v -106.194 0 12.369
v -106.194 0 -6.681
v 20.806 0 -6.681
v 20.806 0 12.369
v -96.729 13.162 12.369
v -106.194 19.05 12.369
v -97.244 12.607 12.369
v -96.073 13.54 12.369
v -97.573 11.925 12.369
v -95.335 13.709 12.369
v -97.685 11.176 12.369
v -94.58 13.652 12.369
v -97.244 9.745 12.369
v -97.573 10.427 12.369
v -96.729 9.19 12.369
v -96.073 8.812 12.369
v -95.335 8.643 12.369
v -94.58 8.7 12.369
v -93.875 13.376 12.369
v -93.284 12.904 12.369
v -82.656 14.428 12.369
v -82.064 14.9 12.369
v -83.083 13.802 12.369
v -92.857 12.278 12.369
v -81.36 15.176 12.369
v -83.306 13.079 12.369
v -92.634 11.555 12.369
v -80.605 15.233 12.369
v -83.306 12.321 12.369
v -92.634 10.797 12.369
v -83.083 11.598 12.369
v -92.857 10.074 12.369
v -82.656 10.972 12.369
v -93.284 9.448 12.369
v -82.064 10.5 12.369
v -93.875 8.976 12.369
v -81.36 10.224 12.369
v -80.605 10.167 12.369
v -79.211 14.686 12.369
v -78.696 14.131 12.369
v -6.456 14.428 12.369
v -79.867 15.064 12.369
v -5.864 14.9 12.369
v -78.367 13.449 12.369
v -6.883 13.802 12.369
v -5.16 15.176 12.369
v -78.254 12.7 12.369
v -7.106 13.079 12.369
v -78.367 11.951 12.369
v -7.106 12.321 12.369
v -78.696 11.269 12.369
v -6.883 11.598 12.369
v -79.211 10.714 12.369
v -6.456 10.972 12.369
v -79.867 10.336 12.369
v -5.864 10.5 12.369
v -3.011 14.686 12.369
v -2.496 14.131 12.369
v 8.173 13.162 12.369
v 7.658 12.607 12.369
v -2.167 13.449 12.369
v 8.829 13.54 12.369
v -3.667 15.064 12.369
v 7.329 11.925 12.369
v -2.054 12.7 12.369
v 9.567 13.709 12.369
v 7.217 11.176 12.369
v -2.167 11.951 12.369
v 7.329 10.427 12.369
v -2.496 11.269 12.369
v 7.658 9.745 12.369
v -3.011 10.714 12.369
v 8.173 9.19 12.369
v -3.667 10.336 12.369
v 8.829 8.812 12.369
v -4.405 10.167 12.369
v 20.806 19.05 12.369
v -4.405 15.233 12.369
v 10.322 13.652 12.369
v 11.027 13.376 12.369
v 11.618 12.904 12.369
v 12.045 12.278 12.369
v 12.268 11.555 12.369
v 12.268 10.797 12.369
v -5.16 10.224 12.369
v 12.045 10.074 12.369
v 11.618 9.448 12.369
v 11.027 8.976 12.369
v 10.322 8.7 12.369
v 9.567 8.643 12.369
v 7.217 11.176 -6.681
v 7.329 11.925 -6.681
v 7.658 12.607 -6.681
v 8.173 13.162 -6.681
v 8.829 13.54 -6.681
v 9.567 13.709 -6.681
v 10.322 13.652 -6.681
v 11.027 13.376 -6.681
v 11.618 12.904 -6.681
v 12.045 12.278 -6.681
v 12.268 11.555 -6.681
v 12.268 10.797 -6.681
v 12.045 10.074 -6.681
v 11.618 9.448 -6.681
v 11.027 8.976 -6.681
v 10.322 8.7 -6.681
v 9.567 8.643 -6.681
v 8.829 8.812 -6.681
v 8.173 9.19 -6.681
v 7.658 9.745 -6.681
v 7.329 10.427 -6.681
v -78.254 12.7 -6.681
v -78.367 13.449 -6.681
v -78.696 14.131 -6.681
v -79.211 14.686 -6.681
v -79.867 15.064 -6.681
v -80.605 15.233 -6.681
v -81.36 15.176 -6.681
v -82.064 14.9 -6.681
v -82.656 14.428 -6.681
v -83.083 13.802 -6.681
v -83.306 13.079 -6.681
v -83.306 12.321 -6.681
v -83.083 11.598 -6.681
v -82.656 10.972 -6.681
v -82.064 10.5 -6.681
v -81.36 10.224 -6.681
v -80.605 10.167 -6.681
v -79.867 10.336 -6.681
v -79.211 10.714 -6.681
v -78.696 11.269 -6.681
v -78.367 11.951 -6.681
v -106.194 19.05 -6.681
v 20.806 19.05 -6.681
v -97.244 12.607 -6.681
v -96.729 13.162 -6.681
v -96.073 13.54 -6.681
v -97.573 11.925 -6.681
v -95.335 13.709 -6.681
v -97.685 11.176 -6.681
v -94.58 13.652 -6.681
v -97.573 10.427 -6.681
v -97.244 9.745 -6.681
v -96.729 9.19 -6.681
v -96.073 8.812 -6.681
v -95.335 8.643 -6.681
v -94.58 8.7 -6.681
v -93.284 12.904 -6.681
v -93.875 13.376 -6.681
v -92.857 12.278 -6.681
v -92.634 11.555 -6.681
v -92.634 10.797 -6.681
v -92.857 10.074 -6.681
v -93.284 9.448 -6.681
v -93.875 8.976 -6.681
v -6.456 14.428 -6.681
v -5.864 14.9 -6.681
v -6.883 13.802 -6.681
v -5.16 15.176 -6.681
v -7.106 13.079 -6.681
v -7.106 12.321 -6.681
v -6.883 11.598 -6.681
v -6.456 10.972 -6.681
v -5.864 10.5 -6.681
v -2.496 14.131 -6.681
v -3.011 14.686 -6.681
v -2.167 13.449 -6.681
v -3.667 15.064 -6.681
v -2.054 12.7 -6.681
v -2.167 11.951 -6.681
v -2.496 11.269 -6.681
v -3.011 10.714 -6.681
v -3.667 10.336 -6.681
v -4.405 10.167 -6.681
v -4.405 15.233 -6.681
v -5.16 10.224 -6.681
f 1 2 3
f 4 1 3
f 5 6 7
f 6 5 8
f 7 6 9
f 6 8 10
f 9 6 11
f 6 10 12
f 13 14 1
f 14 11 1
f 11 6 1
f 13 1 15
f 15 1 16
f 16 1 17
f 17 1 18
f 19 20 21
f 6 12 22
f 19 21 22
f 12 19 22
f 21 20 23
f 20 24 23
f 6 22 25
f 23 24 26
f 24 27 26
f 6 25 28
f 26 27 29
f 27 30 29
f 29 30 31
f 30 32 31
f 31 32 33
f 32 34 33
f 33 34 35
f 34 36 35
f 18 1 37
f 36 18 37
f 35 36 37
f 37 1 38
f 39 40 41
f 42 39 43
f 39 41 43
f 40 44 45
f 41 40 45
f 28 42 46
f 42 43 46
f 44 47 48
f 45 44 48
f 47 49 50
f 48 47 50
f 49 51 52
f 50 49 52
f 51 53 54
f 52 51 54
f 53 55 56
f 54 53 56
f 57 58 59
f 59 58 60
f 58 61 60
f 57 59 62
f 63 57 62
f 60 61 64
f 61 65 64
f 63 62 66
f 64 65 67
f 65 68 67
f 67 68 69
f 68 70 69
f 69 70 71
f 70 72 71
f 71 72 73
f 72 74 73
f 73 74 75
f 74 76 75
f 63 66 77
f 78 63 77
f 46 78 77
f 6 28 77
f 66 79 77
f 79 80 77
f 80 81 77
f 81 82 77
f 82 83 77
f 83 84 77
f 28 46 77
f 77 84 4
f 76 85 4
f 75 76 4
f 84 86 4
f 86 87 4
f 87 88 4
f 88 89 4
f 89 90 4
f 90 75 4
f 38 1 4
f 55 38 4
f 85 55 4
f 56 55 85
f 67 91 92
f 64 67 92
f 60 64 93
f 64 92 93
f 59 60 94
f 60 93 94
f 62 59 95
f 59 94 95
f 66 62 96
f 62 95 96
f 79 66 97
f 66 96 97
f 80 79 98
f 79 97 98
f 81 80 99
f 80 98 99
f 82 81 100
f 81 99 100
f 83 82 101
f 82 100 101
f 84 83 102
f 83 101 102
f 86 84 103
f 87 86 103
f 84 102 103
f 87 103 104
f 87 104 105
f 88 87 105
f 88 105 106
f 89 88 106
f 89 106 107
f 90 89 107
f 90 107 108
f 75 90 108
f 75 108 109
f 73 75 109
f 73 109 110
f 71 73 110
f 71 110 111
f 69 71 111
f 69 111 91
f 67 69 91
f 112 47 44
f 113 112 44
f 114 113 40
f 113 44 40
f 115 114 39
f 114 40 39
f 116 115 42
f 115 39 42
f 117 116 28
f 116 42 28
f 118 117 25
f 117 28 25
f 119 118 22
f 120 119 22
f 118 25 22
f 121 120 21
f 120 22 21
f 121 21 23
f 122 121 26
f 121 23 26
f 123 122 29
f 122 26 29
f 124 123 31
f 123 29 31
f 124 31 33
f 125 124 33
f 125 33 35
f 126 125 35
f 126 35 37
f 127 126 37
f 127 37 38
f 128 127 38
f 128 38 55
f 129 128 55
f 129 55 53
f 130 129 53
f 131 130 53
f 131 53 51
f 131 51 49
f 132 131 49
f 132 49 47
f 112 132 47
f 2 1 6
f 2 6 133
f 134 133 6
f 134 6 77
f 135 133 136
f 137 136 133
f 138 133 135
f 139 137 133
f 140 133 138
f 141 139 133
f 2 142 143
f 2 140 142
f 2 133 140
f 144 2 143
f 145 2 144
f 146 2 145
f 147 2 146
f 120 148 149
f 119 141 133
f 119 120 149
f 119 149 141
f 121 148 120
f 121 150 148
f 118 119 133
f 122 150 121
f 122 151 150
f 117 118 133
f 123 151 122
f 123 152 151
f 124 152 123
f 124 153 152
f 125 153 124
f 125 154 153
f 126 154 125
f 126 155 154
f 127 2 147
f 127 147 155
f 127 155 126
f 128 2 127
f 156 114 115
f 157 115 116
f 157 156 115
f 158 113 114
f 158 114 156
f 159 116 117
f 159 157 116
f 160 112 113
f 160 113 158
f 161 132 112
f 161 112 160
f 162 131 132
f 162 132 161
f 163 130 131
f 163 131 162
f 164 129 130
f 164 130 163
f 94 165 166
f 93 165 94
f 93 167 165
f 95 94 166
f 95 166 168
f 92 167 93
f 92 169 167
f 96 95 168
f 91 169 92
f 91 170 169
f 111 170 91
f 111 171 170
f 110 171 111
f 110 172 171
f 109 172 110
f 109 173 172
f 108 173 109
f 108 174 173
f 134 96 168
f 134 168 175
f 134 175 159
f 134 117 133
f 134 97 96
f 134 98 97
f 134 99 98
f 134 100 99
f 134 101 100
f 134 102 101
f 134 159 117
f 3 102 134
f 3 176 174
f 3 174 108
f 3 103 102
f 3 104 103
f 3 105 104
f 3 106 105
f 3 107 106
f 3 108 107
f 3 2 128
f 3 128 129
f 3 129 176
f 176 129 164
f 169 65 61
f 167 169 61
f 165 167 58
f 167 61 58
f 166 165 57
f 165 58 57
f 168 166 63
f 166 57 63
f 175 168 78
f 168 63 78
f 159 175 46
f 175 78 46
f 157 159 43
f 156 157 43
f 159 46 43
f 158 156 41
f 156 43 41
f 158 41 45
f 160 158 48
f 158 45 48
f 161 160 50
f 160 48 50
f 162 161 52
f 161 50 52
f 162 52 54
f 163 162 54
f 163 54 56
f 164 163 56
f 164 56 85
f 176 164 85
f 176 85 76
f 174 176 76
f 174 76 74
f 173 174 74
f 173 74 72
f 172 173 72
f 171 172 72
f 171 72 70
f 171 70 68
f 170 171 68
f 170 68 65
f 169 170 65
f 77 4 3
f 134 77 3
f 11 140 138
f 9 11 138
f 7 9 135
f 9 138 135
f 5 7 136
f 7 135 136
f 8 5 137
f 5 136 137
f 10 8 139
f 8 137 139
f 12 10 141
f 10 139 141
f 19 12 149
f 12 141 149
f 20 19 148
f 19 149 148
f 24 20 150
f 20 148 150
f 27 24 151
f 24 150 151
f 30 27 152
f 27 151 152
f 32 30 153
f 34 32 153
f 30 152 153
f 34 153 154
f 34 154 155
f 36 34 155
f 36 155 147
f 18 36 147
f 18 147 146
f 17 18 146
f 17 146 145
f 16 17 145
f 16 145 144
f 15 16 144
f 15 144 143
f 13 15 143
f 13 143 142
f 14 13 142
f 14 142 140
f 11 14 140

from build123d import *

# Parameters (mm, degrees)
SKETCH1_W           = 127
SKETCH1_H           = 19.05
BOSS_EXTRUDE1_DEPTH = 19.05
CUT_EXTRUDE1_REACH  = 111.559
SKETCH2_R           = 2.54
CUT_EXTRUDE2_REACH  = 111.559
SKETCH3_R           = 2.54


with BuildPart() as part:
    # Sketch1 → Boss-Extrude1 (new body)
    with BuildSketch(Plane(origin=(0, 0, 0), x_dir=(1, 0, 0), z_dir=(0, 1, 0))):
        with Locations((-42.694499973, -2.843794964)):
            Rectangle(SKETCH1_W, SKETCH1_H)
    extrude(amount=BOSS_EXTRUDE1_DEPTH)

    # Sketch2 → Cut-Extrude1 (cut, up to next)
    with BuildSketch(Plane.XY.offset(12.368794964), mode=Mode.PRIVATE) as cut_extrude1_sk1:
        with Locations((-4.594499973, 12.7)):
            Circle(SKETCH2_R)
    cut_extrude1_tool1 = extrude(cut_extrude1_sk1.sketch, amount=-CUT_EXTRUDE1_REACH, mode=Mode.PRIVATE) & part.part
    # Sketch2 → Cut-Extrude1 (cut, up to next)
    with BuildSketch(Plane.XY.offset(12.368794964), mode=Mode.PRIVATE) as cut_extrude1_sk2:
        with Locations((-80.794499973, 12.7)):
            Circle(SKETCH2_R)
    cut_extrude1_tool2 = extrude(cut_extrude1_sk2.sketch, amount=-CUT_EXTRUDE1_REACH, mode=Mode.PRIVATE) & part.part
    add(cut_extrude1_tool1.solids().sort_by_distance((-4.5945, 12.7, 12.368795))[0], mode=Mode.SUBTRACT)
    add(cut_extrude1_tool2.solids().sort_by_distance((-80.7945, 12.7, 12.368795))[0], mode=Mode.SUBTRACT)

    # Sketch3 → Cut-Extrude2 (cut, up to next)
    with BuildSketch(Plane(origin=(0, 0, -6.681205036), x_dir=(-1, 0, 0), z_dir=(0, 0, -1)), mode=Mode.PRIVATE) as cut_extrude2_sk1:
        with Locations((95.145499973, 11.176)):
            Circle(SKETCH3_R)
    cut_extrude2_tool1 = extrude(cut_extrude2_sk1.sketch, amount=-CUT_EXTRUDE2_REACH, mode=Mode.PRIVATE) & part.part
    # Sketch3 → Cut-Extrude2 (cut, up to next)
    with BuildSketch(Plane(origin=(0, 0, -6.681205036), x_dir=(-1, 0, 0), z_dir=(0, 0, -1)), mode=Mode.PRIVATE) as cut_extrude2_sk2:
        with Locations((-9.756500027, 11.176)):
            Circle(SKETCH3_R)
    cut_extrude2_tool2 = extrude(cut_extrude2_sk2.sketch, amount=-CUT_EXTRUDE2_REACH, mode=Mode.PRIVATE) & part.part
    add(cut_extrude2_tool1.solids().sort_by_distance((-95.1455, 11.176, -6.681205))[0], mode=Mode.SUBTRACT)
    add(cut_extrude2_tool2.solids().sort_by_distance((9.7565, 11.176, -6.681205))[0], mode=Mode.SUBTRACT)


solid = part.part
